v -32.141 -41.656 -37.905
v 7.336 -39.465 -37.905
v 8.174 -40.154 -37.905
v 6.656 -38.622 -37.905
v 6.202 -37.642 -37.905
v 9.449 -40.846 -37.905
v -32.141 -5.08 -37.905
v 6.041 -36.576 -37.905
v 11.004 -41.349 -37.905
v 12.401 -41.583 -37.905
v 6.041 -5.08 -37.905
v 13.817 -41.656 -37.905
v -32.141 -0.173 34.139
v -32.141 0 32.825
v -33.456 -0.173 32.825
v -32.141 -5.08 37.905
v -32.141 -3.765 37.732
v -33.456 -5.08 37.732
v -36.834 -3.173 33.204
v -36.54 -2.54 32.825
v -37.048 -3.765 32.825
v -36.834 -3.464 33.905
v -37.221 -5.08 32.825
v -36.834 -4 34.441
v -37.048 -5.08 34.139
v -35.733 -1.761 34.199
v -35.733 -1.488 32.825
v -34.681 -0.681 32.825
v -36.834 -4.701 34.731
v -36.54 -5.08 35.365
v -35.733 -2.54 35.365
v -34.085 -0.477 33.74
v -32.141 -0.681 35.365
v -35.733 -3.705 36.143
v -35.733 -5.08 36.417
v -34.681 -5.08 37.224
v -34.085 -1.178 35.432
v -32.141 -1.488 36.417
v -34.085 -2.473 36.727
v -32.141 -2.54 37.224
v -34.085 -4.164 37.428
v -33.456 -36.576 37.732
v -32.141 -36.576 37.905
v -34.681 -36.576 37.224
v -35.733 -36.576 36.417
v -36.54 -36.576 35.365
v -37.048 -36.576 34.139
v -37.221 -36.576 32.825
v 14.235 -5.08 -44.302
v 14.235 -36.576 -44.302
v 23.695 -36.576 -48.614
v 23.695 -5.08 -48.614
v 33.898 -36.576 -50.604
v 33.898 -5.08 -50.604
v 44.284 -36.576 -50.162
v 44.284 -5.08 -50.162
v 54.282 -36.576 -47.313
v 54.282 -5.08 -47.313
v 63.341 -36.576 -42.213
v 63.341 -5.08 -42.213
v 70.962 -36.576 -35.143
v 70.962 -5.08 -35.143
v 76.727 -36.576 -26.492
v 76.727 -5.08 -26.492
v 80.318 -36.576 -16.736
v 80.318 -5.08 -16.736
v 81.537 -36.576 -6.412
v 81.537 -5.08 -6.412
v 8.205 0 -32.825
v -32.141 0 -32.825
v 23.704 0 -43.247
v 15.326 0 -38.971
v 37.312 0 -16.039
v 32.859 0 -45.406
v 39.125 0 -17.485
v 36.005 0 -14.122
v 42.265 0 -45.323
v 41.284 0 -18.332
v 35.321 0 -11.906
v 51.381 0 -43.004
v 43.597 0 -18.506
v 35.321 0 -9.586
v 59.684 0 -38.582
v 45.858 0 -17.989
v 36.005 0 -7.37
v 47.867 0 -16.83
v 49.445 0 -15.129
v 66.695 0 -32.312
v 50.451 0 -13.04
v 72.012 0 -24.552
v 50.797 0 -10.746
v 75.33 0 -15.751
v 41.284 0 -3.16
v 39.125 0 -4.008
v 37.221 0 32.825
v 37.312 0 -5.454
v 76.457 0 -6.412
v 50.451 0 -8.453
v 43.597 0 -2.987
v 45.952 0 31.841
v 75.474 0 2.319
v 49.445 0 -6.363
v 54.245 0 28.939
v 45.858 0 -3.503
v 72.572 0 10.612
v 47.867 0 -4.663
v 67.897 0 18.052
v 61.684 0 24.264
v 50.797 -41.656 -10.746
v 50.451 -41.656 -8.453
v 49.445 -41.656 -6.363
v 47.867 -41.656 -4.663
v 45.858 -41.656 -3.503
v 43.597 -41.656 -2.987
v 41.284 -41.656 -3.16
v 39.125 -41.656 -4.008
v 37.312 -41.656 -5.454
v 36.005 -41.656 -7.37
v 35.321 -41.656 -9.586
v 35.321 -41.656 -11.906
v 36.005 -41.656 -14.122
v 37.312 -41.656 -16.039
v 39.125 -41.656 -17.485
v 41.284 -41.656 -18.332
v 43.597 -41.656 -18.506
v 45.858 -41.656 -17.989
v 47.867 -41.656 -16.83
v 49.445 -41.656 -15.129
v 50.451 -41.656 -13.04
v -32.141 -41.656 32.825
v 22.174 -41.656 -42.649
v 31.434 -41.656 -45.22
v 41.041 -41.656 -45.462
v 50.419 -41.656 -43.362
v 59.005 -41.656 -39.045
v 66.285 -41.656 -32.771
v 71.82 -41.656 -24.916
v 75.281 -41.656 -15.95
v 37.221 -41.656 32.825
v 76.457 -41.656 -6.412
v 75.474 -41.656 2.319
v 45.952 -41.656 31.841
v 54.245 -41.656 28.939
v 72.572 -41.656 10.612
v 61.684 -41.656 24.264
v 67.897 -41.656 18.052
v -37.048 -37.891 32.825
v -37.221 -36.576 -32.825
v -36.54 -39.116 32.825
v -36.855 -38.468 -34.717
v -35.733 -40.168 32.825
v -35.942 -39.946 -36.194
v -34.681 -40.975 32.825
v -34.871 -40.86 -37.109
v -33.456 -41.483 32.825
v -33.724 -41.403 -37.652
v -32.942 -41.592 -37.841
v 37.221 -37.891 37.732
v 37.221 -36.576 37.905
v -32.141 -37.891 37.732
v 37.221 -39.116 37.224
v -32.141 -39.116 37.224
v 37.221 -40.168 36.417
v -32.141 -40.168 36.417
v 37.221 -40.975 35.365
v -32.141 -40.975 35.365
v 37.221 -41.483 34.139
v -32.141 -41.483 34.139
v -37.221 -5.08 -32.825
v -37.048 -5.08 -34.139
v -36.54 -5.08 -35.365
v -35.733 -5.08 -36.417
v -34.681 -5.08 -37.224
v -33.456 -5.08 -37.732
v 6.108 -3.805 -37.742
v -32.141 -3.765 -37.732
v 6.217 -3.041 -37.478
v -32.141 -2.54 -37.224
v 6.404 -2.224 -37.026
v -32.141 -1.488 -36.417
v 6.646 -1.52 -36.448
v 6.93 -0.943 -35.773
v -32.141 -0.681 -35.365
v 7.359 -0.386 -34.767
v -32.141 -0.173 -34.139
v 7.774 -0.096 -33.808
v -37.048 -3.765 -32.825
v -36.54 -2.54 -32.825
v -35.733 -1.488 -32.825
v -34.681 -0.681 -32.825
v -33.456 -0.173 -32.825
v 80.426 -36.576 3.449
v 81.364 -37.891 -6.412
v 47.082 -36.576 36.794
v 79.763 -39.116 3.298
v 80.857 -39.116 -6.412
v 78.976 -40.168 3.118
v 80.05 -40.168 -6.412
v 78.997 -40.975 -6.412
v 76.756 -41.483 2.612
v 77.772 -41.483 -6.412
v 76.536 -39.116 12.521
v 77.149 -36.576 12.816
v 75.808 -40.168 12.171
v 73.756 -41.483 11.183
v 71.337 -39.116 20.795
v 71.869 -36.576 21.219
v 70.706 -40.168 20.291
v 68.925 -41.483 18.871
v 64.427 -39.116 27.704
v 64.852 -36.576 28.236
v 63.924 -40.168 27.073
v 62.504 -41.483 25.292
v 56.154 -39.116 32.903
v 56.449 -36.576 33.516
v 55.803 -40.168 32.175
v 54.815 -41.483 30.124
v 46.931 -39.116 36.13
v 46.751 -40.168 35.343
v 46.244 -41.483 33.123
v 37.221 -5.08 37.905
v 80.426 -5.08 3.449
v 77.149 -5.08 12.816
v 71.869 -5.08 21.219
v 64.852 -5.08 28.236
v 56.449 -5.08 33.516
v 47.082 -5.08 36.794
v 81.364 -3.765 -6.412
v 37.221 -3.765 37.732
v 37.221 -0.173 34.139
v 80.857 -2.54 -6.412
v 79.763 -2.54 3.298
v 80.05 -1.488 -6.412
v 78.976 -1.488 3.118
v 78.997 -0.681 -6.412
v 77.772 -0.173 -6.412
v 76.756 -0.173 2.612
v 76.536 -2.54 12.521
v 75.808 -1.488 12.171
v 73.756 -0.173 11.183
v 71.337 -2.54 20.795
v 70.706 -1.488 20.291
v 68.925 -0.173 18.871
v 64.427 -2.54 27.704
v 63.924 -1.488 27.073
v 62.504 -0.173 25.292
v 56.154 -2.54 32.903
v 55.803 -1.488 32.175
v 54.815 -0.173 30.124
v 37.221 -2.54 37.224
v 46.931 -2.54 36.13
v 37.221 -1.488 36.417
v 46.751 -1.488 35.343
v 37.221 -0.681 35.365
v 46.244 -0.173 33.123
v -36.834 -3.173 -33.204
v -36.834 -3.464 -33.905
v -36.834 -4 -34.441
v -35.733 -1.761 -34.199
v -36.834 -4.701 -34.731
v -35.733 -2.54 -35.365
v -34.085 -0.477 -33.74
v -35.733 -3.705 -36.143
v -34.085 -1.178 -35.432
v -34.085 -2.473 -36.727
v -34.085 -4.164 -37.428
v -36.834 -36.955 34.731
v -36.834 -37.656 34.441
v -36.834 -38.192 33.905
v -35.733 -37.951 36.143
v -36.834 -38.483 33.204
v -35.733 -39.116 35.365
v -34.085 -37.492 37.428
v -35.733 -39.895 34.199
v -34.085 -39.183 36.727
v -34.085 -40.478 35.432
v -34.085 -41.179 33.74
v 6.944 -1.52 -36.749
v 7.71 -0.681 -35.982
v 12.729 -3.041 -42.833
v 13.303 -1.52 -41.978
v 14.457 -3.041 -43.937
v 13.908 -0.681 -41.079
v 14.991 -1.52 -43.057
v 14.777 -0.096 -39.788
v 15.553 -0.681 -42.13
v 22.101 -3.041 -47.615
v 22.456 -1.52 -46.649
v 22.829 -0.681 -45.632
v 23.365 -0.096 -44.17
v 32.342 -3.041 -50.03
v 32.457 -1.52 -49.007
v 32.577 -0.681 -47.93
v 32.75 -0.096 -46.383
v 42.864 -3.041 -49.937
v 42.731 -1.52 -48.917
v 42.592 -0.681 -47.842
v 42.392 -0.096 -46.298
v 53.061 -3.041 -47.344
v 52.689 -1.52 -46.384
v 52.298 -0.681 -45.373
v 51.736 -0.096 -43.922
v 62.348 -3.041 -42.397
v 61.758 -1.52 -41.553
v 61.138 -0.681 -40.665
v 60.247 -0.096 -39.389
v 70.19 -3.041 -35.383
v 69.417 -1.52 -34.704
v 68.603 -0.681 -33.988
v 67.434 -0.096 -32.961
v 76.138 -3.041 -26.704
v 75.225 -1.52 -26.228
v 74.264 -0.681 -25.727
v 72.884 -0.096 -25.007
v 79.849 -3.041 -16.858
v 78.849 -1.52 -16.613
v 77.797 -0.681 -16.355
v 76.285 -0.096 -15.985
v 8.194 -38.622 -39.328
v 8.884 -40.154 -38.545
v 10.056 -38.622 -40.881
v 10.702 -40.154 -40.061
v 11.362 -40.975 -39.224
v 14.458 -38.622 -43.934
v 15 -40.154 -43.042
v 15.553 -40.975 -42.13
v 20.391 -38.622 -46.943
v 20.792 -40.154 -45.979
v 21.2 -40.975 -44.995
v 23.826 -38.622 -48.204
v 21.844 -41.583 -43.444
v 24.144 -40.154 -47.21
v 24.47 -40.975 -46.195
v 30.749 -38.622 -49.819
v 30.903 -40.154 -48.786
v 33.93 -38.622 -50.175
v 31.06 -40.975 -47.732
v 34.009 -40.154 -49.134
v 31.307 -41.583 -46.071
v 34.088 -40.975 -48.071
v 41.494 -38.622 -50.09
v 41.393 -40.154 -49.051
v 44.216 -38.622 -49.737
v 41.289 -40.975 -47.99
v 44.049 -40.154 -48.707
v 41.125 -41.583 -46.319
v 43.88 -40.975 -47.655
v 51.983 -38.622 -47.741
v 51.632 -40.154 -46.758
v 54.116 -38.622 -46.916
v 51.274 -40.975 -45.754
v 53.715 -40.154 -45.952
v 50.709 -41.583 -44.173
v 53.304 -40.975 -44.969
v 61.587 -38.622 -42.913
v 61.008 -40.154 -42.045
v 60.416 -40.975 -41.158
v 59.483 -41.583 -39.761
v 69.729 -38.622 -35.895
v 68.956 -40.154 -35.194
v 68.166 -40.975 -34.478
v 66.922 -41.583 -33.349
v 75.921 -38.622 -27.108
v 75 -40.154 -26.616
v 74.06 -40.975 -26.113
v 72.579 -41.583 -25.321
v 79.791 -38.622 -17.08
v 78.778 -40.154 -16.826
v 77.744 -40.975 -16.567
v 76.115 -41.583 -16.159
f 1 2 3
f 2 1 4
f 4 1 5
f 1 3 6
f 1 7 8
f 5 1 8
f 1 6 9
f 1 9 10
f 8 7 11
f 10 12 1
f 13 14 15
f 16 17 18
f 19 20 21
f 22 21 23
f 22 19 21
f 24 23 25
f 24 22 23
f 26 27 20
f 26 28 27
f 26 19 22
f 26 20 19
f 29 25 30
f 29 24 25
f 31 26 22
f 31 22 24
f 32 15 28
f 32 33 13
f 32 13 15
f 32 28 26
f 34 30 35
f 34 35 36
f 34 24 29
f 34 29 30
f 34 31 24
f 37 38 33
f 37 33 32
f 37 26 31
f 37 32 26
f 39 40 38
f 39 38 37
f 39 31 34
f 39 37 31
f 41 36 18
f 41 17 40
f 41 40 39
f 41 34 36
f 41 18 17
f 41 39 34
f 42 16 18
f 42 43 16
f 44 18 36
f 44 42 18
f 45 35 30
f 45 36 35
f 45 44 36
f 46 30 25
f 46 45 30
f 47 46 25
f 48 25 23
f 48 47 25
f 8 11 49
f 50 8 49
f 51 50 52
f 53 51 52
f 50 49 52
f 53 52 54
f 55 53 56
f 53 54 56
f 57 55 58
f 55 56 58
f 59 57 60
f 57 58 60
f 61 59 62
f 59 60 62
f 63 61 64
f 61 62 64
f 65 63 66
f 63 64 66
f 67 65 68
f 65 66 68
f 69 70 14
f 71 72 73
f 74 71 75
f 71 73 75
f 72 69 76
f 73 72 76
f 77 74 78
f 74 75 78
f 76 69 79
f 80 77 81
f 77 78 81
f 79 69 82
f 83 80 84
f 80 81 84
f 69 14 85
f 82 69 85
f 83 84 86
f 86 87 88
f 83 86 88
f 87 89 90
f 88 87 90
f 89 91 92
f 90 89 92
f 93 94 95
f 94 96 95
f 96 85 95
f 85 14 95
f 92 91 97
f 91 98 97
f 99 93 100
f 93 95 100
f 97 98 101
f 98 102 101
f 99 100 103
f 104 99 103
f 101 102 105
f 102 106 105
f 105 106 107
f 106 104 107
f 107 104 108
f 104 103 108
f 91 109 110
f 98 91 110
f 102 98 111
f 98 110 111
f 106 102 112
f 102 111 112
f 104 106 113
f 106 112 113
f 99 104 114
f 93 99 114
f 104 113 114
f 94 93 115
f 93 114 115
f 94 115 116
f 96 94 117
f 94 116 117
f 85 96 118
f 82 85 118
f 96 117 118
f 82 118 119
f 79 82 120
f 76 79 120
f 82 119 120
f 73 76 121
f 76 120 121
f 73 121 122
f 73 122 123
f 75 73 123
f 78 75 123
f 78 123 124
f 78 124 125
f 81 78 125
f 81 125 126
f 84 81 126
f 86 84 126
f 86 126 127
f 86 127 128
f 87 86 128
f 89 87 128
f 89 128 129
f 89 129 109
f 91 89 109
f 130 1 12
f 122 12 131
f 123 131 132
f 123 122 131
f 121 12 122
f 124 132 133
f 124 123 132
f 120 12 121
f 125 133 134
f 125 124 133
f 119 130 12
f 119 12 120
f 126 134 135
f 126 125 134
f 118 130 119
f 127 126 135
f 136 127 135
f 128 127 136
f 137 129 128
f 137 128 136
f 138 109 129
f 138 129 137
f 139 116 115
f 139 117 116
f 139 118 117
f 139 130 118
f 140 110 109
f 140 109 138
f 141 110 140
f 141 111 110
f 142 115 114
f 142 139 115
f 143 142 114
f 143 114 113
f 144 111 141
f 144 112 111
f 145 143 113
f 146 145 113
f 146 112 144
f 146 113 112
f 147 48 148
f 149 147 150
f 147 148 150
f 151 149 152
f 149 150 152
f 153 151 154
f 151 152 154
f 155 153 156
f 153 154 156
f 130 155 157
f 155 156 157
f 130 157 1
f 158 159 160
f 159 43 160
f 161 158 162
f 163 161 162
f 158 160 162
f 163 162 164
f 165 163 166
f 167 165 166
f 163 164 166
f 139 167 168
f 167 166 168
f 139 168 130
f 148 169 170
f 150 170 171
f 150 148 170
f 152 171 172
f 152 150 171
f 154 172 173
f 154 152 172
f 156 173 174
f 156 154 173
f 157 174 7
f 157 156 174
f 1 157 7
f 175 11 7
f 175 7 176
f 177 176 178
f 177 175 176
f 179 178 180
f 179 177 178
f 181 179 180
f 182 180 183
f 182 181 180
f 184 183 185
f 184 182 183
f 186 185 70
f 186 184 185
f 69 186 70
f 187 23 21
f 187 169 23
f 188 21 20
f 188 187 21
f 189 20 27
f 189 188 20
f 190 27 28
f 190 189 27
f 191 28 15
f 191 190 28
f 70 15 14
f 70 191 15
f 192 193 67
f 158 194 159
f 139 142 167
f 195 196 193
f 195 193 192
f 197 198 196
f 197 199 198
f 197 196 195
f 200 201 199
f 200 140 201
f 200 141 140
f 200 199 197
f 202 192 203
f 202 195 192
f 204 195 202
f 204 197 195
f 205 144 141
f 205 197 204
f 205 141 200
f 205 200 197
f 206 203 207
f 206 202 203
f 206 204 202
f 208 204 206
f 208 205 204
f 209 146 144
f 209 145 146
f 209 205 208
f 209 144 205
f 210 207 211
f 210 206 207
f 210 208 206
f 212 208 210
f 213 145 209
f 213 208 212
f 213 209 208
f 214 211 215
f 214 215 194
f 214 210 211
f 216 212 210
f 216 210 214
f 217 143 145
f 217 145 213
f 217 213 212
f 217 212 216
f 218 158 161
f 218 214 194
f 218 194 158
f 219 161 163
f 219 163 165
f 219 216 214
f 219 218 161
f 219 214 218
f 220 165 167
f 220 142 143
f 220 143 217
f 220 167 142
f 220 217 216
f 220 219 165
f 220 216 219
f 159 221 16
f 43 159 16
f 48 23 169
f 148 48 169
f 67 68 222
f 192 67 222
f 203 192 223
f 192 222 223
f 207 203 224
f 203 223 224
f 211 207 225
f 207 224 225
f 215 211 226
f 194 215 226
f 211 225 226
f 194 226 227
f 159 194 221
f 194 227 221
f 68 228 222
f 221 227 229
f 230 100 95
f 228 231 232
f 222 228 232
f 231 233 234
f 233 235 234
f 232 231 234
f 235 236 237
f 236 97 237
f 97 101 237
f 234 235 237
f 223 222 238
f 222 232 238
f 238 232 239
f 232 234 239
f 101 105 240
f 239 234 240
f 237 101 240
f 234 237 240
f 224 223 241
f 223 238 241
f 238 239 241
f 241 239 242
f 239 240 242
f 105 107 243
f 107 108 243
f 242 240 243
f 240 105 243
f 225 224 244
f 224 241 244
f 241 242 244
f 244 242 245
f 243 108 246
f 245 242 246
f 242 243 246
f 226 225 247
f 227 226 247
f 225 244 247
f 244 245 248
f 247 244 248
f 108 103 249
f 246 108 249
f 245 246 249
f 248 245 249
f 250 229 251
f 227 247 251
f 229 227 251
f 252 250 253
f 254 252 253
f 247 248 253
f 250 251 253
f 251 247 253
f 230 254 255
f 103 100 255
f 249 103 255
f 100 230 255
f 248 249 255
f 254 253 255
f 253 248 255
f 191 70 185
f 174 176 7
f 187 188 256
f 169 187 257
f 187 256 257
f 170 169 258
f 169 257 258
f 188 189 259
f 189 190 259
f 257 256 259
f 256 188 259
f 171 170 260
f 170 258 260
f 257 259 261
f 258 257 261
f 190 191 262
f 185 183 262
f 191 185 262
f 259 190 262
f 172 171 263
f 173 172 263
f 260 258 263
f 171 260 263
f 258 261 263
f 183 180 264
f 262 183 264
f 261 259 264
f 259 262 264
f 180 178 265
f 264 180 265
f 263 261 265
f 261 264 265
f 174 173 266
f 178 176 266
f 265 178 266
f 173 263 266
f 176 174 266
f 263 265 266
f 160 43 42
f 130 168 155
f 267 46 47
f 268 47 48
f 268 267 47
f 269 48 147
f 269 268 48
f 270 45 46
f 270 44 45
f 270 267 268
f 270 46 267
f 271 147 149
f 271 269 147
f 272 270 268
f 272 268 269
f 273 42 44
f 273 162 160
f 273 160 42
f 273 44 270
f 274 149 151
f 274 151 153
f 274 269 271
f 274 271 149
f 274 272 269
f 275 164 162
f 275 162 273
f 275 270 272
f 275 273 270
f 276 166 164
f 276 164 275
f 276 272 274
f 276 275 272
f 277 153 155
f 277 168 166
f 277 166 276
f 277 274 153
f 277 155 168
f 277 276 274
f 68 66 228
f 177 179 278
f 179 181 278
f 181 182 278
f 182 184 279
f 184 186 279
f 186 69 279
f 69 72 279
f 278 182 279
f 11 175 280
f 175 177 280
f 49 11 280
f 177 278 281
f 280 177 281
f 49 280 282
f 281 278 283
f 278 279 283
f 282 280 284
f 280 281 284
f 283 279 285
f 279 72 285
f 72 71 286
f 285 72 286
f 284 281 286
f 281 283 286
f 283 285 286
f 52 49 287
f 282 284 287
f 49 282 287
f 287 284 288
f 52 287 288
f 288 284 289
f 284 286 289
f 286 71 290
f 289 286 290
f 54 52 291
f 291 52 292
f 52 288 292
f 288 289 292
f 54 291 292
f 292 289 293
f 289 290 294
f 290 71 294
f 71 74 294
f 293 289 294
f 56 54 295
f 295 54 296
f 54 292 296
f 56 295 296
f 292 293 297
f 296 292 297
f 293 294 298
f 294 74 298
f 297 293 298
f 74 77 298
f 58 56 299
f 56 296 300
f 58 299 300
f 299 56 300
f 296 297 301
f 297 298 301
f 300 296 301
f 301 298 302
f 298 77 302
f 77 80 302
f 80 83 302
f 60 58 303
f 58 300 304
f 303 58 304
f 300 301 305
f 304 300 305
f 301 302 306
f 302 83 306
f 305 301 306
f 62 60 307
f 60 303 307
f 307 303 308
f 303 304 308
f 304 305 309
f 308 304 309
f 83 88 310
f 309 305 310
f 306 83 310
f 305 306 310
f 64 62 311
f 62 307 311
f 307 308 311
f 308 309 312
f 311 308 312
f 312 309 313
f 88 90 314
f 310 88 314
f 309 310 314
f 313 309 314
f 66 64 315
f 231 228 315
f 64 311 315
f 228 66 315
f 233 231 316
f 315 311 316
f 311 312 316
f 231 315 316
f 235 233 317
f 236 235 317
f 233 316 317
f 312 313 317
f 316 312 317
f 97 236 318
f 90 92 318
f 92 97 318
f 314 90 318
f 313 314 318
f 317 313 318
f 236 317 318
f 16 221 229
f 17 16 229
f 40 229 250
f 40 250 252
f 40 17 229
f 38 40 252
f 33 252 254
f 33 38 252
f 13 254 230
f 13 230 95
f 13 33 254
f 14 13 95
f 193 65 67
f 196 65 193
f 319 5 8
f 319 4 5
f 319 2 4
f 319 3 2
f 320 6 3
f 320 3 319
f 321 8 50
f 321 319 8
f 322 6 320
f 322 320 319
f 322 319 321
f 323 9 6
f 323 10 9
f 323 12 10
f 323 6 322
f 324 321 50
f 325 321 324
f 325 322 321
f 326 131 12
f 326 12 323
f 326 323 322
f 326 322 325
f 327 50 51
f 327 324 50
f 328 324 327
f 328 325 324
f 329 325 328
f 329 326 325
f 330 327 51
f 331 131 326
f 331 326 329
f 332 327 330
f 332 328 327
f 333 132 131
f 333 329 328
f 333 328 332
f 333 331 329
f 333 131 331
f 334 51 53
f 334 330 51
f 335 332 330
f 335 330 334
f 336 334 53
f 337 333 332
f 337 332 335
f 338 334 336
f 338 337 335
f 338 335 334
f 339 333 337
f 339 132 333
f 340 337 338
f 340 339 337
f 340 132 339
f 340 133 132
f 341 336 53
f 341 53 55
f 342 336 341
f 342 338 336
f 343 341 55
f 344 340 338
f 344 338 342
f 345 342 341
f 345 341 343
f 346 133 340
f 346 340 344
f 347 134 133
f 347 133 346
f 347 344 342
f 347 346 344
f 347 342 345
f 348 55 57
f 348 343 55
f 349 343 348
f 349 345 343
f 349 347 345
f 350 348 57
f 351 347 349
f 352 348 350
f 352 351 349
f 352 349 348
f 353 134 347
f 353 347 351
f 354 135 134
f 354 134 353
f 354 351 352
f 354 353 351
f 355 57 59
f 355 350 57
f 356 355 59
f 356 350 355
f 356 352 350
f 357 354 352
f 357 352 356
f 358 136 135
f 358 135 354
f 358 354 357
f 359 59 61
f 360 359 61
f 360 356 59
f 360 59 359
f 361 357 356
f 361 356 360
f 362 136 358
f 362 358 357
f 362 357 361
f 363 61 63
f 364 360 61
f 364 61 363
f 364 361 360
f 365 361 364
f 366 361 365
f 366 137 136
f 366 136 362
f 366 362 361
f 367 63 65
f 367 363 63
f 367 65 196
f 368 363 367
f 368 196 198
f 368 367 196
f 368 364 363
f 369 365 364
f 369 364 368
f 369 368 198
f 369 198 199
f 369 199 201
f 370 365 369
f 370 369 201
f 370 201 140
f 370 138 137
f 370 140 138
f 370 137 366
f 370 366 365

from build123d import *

# Parameters (mm, degrees)
F1_DEPTH = 41.656
F2_R     = 5.08
F3_R     = 7.781116
F4_DEPTH = 55.626


with BuildPart() as f1:
    # F0 (on Front) → F1 (new body)
    with BuildSketch(Plane.XZ):
        with BuildLine():
            Line((37.220769, -37.904616), (37.220769, 37.904616))
            ThreePointArc((37.220769, 37.904616), (-3.764667, 10.445012), (6.040904, -37.904616))
            Line((6.040904, -37.904616), (37.220769, -37.904616))
        make_face()
        with BuildLine():
            ThreePointArc((81.537427, -6.412042), (68.557378, 24.924568), (37.220769, 37.904616))
            Line((37.220769, 37.904616), (37.220769, -37.904616))
            Line((37.220769, -37.904616), (6.040904, -37.904616))
            ThreePointArc((6.040904, -37.904616), (54.282111, -47.312858), (81.537427, -6.412042))
        make_face()
        with BuildLine():
            Line((37.220769, 37.904616), (-37.220769, 37.904616))
            Line((-37.220769, 37.904616), (-37.220769, -37.904616))
            Line((-37.220769, -37.904616), (6.040904, -37.904616))
            ThreePointArc((6.040904, -37.904616), (-3.764667, 10.445012), (37.220769, 37.904616))
        make_face()
    extrude(amount=F1_DEPTH)

    # F2
    f2_edges = [f1.edges().sort_by_distance(p)[0] for p in [
        (0, -41.656, 37.904616),
        (37.220769, -20.828, 37.904616),
        (78.206204, 0, -23.269096),
        (-15.589932, 0, -37.904616),
        (-37.220769, 0, 0),
        (-37.220769, -20.828, 37.904616),
        (-37.220769, -41.656, 0),
        (-37.220769, -20.828, -37.904616),
    ]]
    fillet(f2_edges, radius=F2_R)

    # F3 (on face) → F4 (cut)
    with BuildSketch(Plane.XZ.offset(41.656)):
        with Locations((43.015637, -10.746155)):
            Circle(F3_R)
    extrude(amount=-F4_DEPTH, mode=Mode.SUBTRACT)


solid = f1.part
